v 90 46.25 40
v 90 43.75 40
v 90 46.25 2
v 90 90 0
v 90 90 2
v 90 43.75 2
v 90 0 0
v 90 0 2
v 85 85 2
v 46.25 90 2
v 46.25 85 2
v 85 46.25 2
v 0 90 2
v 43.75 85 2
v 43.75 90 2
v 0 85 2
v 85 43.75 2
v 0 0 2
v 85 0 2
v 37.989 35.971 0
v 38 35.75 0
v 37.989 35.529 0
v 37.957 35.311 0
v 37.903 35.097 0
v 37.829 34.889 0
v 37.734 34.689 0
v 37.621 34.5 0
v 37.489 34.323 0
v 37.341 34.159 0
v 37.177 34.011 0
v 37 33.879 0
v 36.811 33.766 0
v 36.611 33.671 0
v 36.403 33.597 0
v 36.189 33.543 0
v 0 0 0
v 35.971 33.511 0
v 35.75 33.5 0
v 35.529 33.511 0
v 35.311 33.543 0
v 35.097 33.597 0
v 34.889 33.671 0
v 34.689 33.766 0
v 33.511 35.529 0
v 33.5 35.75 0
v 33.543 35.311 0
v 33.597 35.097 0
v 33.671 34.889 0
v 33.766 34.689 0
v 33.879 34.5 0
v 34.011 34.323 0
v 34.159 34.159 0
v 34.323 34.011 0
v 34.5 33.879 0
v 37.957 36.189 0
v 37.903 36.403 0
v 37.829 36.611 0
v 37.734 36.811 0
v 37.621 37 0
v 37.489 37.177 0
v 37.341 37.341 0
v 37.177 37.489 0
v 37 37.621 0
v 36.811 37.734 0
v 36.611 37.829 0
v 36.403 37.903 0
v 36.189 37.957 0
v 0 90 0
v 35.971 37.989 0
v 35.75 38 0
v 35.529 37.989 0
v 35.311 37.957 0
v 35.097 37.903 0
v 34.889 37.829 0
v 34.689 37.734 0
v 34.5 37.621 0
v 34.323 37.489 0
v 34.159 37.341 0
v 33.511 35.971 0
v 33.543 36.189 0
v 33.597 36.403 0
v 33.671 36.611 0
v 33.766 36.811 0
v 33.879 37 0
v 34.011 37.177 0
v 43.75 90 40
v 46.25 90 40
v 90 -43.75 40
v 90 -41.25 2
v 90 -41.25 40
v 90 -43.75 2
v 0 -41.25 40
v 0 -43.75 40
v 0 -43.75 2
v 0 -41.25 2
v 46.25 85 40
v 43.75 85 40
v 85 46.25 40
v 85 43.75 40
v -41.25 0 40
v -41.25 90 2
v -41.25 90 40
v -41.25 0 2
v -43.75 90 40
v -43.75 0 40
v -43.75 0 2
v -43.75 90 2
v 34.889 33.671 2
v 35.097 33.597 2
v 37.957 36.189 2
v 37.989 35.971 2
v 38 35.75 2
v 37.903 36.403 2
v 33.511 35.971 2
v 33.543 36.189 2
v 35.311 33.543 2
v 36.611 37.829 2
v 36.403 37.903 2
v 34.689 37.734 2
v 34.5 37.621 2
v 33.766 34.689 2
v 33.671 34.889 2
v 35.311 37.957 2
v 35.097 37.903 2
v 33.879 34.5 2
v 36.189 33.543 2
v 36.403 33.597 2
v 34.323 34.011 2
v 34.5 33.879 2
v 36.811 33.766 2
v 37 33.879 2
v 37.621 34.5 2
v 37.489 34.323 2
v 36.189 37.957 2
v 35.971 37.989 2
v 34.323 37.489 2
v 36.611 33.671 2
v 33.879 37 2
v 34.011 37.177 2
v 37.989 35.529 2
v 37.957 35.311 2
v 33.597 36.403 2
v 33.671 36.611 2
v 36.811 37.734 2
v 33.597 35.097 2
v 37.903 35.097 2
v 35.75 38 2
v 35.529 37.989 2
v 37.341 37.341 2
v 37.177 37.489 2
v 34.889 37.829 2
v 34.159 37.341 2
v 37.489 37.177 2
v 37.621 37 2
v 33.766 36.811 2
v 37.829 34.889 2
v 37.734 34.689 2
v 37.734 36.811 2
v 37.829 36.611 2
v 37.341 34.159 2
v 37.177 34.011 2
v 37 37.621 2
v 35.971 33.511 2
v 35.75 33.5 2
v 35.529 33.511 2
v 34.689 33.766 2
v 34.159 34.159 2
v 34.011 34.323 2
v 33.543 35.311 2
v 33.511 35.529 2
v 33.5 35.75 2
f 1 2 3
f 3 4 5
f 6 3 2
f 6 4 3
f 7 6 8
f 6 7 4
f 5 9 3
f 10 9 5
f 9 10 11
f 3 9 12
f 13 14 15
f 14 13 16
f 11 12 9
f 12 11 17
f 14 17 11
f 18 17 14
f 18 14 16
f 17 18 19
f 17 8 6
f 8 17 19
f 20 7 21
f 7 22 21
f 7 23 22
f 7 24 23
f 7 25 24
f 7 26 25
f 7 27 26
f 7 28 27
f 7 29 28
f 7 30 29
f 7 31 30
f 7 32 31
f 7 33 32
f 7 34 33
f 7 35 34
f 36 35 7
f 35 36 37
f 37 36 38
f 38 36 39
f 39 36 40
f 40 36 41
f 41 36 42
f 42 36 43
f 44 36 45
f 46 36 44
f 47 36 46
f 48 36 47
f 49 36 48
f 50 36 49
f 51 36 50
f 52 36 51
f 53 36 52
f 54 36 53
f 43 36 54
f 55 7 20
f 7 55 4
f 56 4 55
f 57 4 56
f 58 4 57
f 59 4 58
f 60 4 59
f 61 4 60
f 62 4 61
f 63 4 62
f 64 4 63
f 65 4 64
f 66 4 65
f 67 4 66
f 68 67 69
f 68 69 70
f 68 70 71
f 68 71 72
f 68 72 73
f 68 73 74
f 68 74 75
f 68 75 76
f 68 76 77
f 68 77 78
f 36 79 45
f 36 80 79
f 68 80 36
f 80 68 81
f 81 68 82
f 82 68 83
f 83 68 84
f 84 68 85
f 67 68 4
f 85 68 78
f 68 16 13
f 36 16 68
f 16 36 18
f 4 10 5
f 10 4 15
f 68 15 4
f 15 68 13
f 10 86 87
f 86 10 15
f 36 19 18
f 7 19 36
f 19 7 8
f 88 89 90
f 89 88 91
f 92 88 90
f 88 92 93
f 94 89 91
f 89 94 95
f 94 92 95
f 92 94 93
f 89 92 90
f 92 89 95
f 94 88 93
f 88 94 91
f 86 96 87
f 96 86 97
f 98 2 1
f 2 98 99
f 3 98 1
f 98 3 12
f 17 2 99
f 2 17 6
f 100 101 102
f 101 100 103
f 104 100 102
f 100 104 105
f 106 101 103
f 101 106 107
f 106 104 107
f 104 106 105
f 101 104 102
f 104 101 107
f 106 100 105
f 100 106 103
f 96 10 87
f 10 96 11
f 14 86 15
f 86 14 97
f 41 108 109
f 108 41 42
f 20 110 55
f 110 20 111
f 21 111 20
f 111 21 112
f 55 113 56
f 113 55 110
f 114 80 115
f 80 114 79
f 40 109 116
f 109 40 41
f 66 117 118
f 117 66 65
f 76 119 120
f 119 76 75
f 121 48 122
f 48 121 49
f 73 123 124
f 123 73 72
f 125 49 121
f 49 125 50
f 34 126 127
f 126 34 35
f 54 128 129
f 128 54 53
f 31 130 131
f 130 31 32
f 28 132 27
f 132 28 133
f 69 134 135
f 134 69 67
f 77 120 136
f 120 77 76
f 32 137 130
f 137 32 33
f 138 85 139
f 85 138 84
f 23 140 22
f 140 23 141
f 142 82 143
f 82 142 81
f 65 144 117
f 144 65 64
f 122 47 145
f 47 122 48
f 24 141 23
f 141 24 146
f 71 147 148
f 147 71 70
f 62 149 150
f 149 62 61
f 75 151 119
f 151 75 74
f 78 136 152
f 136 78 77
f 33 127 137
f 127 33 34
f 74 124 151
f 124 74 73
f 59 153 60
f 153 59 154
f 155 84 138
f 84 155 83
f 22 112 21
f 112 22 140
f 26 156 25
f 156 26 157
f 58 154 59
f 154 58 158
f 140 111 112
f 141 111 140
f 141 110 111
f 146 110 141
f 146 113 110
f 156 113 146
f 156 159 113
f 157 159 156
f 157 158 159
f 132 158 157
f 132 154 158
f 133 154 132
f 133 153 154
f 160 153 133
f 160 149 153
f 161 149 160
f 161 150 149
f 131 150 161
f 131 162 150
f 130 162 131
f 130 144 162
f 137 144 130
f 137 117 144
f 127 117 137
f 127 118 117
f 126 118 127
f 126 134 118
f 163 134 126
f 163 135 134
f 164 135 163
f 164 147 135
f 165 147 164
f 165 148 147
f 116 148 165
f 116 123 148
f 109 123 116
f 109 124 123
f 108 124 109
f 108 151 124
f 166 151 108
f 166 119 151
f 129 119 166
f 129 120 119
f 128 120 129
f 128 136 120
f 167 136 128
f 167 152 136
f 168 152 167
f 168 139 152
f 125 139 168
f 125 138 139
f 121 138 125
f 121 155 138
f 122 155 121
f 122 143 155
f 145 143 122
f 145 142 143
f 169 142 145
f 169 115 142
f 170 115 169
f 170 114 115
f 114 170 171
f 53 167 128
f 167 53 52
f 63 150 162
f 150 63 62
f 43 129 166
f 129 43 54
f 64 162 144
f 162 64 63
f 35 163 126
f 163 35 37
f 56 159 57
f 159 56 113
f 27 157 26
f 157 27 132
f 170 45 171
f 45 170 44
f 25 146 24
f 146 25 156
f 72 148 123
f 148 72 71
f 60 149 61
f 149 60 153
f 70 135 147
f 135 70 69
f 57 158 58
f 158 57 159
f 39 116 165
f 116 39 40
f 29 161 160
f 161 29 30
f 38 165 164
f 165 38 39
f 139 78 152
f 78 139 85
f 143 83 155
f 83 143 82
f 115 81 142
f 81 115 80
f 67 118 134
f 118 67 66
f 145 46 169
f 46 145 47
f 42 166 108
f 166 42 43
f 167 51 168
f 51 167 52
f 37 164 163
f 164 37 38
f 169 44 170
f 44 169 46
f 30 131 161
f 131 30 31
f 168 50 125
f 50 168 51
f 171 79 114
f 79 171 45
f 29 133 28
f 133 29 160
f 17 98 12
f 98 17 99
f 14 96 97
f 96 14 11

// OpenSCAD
// === Dimensions ===
// Top plate thickness
top_plate_z = 2;
// Wall thickness
wall_thick = 2.5;
// Wall height (from top of top plate)
wall_height = 40 - top_plate_z;
// Outer width (X)
outer_x = 90;
// Outer depth (Y)
outer_y = 90;
// Screw hole diameter
screw_dia = 4.5;
// Screw hole pattern spacing (square)
screw_pattern = 71.5;
// Cable notch width
notch_width = 12;
// Cable notch depth from top of wall
notch_depth = 8;

// === Derived ===
// Inner width
inner_x = outer_x - 2 * wall_thick;
// Inner depth
inner_y = outer_y - 2 * wall_thick;
// Half dimensions
half_x = outer_x / 2;
half_y = outer_y / 2;
// Half screw pattern
half_pattern = screw_pattern / 2;

// === Build ===
$fn = 64;

// Main box: top plate + 4 walls
difference() {
    // Outer shape (top plate + walls)
    union() {
        // Top plate
        cube([outer_x, outer_y, top_plate_z], center = false);
        // Four walls
        // Back wall (Y- side)
        translate([0, -half_y + wall_thick/2, top_plate_z])
            cube([outer_x, wall_thick, wall_height], center = false);
        // Front wall (Y+ side)
        translate([0, half_y - wall_thick/2, top_plate_z])
            cube([outer_x, wall_thick, wall_height], center = false);
        // Left wall (X- side)
        translate([-half_x + wall_thick/2, 0, top_plate_z])
            cube([wall_thick, outer_y, wall_height], center = false);
        // Right wall (X+ side)
        translate([half_x - wall_thick/2, 0, top_plate_z])
            cube([wall_thick, outer_y, wall_height], center = false);
    }
    
    // Cut out inner cavity
    translate([0, 0, top_plate_z])
        cube([inner_x, inner_y, wall_height + 0.01], center = false);
    
    // Four screw holes
    for (x = [-half_pattern, half_pattern]) {
        for (y = [-half_pattern, half_pattern]) {
            translate([x, y, -0.01])
                cylinder(d = screw_dia, h = top_plate_z + 0.01, center = false);
        }
    }
    
    // Cable notch in the front wall (Y+ side)
    // Notch is 12mm wide, centered along X, from z=32 to z=40
    translate([0, half_y - 0.01, 32])
        cube([notch_width, wall_thick + 0.02, notch_depth], center = false);
}
